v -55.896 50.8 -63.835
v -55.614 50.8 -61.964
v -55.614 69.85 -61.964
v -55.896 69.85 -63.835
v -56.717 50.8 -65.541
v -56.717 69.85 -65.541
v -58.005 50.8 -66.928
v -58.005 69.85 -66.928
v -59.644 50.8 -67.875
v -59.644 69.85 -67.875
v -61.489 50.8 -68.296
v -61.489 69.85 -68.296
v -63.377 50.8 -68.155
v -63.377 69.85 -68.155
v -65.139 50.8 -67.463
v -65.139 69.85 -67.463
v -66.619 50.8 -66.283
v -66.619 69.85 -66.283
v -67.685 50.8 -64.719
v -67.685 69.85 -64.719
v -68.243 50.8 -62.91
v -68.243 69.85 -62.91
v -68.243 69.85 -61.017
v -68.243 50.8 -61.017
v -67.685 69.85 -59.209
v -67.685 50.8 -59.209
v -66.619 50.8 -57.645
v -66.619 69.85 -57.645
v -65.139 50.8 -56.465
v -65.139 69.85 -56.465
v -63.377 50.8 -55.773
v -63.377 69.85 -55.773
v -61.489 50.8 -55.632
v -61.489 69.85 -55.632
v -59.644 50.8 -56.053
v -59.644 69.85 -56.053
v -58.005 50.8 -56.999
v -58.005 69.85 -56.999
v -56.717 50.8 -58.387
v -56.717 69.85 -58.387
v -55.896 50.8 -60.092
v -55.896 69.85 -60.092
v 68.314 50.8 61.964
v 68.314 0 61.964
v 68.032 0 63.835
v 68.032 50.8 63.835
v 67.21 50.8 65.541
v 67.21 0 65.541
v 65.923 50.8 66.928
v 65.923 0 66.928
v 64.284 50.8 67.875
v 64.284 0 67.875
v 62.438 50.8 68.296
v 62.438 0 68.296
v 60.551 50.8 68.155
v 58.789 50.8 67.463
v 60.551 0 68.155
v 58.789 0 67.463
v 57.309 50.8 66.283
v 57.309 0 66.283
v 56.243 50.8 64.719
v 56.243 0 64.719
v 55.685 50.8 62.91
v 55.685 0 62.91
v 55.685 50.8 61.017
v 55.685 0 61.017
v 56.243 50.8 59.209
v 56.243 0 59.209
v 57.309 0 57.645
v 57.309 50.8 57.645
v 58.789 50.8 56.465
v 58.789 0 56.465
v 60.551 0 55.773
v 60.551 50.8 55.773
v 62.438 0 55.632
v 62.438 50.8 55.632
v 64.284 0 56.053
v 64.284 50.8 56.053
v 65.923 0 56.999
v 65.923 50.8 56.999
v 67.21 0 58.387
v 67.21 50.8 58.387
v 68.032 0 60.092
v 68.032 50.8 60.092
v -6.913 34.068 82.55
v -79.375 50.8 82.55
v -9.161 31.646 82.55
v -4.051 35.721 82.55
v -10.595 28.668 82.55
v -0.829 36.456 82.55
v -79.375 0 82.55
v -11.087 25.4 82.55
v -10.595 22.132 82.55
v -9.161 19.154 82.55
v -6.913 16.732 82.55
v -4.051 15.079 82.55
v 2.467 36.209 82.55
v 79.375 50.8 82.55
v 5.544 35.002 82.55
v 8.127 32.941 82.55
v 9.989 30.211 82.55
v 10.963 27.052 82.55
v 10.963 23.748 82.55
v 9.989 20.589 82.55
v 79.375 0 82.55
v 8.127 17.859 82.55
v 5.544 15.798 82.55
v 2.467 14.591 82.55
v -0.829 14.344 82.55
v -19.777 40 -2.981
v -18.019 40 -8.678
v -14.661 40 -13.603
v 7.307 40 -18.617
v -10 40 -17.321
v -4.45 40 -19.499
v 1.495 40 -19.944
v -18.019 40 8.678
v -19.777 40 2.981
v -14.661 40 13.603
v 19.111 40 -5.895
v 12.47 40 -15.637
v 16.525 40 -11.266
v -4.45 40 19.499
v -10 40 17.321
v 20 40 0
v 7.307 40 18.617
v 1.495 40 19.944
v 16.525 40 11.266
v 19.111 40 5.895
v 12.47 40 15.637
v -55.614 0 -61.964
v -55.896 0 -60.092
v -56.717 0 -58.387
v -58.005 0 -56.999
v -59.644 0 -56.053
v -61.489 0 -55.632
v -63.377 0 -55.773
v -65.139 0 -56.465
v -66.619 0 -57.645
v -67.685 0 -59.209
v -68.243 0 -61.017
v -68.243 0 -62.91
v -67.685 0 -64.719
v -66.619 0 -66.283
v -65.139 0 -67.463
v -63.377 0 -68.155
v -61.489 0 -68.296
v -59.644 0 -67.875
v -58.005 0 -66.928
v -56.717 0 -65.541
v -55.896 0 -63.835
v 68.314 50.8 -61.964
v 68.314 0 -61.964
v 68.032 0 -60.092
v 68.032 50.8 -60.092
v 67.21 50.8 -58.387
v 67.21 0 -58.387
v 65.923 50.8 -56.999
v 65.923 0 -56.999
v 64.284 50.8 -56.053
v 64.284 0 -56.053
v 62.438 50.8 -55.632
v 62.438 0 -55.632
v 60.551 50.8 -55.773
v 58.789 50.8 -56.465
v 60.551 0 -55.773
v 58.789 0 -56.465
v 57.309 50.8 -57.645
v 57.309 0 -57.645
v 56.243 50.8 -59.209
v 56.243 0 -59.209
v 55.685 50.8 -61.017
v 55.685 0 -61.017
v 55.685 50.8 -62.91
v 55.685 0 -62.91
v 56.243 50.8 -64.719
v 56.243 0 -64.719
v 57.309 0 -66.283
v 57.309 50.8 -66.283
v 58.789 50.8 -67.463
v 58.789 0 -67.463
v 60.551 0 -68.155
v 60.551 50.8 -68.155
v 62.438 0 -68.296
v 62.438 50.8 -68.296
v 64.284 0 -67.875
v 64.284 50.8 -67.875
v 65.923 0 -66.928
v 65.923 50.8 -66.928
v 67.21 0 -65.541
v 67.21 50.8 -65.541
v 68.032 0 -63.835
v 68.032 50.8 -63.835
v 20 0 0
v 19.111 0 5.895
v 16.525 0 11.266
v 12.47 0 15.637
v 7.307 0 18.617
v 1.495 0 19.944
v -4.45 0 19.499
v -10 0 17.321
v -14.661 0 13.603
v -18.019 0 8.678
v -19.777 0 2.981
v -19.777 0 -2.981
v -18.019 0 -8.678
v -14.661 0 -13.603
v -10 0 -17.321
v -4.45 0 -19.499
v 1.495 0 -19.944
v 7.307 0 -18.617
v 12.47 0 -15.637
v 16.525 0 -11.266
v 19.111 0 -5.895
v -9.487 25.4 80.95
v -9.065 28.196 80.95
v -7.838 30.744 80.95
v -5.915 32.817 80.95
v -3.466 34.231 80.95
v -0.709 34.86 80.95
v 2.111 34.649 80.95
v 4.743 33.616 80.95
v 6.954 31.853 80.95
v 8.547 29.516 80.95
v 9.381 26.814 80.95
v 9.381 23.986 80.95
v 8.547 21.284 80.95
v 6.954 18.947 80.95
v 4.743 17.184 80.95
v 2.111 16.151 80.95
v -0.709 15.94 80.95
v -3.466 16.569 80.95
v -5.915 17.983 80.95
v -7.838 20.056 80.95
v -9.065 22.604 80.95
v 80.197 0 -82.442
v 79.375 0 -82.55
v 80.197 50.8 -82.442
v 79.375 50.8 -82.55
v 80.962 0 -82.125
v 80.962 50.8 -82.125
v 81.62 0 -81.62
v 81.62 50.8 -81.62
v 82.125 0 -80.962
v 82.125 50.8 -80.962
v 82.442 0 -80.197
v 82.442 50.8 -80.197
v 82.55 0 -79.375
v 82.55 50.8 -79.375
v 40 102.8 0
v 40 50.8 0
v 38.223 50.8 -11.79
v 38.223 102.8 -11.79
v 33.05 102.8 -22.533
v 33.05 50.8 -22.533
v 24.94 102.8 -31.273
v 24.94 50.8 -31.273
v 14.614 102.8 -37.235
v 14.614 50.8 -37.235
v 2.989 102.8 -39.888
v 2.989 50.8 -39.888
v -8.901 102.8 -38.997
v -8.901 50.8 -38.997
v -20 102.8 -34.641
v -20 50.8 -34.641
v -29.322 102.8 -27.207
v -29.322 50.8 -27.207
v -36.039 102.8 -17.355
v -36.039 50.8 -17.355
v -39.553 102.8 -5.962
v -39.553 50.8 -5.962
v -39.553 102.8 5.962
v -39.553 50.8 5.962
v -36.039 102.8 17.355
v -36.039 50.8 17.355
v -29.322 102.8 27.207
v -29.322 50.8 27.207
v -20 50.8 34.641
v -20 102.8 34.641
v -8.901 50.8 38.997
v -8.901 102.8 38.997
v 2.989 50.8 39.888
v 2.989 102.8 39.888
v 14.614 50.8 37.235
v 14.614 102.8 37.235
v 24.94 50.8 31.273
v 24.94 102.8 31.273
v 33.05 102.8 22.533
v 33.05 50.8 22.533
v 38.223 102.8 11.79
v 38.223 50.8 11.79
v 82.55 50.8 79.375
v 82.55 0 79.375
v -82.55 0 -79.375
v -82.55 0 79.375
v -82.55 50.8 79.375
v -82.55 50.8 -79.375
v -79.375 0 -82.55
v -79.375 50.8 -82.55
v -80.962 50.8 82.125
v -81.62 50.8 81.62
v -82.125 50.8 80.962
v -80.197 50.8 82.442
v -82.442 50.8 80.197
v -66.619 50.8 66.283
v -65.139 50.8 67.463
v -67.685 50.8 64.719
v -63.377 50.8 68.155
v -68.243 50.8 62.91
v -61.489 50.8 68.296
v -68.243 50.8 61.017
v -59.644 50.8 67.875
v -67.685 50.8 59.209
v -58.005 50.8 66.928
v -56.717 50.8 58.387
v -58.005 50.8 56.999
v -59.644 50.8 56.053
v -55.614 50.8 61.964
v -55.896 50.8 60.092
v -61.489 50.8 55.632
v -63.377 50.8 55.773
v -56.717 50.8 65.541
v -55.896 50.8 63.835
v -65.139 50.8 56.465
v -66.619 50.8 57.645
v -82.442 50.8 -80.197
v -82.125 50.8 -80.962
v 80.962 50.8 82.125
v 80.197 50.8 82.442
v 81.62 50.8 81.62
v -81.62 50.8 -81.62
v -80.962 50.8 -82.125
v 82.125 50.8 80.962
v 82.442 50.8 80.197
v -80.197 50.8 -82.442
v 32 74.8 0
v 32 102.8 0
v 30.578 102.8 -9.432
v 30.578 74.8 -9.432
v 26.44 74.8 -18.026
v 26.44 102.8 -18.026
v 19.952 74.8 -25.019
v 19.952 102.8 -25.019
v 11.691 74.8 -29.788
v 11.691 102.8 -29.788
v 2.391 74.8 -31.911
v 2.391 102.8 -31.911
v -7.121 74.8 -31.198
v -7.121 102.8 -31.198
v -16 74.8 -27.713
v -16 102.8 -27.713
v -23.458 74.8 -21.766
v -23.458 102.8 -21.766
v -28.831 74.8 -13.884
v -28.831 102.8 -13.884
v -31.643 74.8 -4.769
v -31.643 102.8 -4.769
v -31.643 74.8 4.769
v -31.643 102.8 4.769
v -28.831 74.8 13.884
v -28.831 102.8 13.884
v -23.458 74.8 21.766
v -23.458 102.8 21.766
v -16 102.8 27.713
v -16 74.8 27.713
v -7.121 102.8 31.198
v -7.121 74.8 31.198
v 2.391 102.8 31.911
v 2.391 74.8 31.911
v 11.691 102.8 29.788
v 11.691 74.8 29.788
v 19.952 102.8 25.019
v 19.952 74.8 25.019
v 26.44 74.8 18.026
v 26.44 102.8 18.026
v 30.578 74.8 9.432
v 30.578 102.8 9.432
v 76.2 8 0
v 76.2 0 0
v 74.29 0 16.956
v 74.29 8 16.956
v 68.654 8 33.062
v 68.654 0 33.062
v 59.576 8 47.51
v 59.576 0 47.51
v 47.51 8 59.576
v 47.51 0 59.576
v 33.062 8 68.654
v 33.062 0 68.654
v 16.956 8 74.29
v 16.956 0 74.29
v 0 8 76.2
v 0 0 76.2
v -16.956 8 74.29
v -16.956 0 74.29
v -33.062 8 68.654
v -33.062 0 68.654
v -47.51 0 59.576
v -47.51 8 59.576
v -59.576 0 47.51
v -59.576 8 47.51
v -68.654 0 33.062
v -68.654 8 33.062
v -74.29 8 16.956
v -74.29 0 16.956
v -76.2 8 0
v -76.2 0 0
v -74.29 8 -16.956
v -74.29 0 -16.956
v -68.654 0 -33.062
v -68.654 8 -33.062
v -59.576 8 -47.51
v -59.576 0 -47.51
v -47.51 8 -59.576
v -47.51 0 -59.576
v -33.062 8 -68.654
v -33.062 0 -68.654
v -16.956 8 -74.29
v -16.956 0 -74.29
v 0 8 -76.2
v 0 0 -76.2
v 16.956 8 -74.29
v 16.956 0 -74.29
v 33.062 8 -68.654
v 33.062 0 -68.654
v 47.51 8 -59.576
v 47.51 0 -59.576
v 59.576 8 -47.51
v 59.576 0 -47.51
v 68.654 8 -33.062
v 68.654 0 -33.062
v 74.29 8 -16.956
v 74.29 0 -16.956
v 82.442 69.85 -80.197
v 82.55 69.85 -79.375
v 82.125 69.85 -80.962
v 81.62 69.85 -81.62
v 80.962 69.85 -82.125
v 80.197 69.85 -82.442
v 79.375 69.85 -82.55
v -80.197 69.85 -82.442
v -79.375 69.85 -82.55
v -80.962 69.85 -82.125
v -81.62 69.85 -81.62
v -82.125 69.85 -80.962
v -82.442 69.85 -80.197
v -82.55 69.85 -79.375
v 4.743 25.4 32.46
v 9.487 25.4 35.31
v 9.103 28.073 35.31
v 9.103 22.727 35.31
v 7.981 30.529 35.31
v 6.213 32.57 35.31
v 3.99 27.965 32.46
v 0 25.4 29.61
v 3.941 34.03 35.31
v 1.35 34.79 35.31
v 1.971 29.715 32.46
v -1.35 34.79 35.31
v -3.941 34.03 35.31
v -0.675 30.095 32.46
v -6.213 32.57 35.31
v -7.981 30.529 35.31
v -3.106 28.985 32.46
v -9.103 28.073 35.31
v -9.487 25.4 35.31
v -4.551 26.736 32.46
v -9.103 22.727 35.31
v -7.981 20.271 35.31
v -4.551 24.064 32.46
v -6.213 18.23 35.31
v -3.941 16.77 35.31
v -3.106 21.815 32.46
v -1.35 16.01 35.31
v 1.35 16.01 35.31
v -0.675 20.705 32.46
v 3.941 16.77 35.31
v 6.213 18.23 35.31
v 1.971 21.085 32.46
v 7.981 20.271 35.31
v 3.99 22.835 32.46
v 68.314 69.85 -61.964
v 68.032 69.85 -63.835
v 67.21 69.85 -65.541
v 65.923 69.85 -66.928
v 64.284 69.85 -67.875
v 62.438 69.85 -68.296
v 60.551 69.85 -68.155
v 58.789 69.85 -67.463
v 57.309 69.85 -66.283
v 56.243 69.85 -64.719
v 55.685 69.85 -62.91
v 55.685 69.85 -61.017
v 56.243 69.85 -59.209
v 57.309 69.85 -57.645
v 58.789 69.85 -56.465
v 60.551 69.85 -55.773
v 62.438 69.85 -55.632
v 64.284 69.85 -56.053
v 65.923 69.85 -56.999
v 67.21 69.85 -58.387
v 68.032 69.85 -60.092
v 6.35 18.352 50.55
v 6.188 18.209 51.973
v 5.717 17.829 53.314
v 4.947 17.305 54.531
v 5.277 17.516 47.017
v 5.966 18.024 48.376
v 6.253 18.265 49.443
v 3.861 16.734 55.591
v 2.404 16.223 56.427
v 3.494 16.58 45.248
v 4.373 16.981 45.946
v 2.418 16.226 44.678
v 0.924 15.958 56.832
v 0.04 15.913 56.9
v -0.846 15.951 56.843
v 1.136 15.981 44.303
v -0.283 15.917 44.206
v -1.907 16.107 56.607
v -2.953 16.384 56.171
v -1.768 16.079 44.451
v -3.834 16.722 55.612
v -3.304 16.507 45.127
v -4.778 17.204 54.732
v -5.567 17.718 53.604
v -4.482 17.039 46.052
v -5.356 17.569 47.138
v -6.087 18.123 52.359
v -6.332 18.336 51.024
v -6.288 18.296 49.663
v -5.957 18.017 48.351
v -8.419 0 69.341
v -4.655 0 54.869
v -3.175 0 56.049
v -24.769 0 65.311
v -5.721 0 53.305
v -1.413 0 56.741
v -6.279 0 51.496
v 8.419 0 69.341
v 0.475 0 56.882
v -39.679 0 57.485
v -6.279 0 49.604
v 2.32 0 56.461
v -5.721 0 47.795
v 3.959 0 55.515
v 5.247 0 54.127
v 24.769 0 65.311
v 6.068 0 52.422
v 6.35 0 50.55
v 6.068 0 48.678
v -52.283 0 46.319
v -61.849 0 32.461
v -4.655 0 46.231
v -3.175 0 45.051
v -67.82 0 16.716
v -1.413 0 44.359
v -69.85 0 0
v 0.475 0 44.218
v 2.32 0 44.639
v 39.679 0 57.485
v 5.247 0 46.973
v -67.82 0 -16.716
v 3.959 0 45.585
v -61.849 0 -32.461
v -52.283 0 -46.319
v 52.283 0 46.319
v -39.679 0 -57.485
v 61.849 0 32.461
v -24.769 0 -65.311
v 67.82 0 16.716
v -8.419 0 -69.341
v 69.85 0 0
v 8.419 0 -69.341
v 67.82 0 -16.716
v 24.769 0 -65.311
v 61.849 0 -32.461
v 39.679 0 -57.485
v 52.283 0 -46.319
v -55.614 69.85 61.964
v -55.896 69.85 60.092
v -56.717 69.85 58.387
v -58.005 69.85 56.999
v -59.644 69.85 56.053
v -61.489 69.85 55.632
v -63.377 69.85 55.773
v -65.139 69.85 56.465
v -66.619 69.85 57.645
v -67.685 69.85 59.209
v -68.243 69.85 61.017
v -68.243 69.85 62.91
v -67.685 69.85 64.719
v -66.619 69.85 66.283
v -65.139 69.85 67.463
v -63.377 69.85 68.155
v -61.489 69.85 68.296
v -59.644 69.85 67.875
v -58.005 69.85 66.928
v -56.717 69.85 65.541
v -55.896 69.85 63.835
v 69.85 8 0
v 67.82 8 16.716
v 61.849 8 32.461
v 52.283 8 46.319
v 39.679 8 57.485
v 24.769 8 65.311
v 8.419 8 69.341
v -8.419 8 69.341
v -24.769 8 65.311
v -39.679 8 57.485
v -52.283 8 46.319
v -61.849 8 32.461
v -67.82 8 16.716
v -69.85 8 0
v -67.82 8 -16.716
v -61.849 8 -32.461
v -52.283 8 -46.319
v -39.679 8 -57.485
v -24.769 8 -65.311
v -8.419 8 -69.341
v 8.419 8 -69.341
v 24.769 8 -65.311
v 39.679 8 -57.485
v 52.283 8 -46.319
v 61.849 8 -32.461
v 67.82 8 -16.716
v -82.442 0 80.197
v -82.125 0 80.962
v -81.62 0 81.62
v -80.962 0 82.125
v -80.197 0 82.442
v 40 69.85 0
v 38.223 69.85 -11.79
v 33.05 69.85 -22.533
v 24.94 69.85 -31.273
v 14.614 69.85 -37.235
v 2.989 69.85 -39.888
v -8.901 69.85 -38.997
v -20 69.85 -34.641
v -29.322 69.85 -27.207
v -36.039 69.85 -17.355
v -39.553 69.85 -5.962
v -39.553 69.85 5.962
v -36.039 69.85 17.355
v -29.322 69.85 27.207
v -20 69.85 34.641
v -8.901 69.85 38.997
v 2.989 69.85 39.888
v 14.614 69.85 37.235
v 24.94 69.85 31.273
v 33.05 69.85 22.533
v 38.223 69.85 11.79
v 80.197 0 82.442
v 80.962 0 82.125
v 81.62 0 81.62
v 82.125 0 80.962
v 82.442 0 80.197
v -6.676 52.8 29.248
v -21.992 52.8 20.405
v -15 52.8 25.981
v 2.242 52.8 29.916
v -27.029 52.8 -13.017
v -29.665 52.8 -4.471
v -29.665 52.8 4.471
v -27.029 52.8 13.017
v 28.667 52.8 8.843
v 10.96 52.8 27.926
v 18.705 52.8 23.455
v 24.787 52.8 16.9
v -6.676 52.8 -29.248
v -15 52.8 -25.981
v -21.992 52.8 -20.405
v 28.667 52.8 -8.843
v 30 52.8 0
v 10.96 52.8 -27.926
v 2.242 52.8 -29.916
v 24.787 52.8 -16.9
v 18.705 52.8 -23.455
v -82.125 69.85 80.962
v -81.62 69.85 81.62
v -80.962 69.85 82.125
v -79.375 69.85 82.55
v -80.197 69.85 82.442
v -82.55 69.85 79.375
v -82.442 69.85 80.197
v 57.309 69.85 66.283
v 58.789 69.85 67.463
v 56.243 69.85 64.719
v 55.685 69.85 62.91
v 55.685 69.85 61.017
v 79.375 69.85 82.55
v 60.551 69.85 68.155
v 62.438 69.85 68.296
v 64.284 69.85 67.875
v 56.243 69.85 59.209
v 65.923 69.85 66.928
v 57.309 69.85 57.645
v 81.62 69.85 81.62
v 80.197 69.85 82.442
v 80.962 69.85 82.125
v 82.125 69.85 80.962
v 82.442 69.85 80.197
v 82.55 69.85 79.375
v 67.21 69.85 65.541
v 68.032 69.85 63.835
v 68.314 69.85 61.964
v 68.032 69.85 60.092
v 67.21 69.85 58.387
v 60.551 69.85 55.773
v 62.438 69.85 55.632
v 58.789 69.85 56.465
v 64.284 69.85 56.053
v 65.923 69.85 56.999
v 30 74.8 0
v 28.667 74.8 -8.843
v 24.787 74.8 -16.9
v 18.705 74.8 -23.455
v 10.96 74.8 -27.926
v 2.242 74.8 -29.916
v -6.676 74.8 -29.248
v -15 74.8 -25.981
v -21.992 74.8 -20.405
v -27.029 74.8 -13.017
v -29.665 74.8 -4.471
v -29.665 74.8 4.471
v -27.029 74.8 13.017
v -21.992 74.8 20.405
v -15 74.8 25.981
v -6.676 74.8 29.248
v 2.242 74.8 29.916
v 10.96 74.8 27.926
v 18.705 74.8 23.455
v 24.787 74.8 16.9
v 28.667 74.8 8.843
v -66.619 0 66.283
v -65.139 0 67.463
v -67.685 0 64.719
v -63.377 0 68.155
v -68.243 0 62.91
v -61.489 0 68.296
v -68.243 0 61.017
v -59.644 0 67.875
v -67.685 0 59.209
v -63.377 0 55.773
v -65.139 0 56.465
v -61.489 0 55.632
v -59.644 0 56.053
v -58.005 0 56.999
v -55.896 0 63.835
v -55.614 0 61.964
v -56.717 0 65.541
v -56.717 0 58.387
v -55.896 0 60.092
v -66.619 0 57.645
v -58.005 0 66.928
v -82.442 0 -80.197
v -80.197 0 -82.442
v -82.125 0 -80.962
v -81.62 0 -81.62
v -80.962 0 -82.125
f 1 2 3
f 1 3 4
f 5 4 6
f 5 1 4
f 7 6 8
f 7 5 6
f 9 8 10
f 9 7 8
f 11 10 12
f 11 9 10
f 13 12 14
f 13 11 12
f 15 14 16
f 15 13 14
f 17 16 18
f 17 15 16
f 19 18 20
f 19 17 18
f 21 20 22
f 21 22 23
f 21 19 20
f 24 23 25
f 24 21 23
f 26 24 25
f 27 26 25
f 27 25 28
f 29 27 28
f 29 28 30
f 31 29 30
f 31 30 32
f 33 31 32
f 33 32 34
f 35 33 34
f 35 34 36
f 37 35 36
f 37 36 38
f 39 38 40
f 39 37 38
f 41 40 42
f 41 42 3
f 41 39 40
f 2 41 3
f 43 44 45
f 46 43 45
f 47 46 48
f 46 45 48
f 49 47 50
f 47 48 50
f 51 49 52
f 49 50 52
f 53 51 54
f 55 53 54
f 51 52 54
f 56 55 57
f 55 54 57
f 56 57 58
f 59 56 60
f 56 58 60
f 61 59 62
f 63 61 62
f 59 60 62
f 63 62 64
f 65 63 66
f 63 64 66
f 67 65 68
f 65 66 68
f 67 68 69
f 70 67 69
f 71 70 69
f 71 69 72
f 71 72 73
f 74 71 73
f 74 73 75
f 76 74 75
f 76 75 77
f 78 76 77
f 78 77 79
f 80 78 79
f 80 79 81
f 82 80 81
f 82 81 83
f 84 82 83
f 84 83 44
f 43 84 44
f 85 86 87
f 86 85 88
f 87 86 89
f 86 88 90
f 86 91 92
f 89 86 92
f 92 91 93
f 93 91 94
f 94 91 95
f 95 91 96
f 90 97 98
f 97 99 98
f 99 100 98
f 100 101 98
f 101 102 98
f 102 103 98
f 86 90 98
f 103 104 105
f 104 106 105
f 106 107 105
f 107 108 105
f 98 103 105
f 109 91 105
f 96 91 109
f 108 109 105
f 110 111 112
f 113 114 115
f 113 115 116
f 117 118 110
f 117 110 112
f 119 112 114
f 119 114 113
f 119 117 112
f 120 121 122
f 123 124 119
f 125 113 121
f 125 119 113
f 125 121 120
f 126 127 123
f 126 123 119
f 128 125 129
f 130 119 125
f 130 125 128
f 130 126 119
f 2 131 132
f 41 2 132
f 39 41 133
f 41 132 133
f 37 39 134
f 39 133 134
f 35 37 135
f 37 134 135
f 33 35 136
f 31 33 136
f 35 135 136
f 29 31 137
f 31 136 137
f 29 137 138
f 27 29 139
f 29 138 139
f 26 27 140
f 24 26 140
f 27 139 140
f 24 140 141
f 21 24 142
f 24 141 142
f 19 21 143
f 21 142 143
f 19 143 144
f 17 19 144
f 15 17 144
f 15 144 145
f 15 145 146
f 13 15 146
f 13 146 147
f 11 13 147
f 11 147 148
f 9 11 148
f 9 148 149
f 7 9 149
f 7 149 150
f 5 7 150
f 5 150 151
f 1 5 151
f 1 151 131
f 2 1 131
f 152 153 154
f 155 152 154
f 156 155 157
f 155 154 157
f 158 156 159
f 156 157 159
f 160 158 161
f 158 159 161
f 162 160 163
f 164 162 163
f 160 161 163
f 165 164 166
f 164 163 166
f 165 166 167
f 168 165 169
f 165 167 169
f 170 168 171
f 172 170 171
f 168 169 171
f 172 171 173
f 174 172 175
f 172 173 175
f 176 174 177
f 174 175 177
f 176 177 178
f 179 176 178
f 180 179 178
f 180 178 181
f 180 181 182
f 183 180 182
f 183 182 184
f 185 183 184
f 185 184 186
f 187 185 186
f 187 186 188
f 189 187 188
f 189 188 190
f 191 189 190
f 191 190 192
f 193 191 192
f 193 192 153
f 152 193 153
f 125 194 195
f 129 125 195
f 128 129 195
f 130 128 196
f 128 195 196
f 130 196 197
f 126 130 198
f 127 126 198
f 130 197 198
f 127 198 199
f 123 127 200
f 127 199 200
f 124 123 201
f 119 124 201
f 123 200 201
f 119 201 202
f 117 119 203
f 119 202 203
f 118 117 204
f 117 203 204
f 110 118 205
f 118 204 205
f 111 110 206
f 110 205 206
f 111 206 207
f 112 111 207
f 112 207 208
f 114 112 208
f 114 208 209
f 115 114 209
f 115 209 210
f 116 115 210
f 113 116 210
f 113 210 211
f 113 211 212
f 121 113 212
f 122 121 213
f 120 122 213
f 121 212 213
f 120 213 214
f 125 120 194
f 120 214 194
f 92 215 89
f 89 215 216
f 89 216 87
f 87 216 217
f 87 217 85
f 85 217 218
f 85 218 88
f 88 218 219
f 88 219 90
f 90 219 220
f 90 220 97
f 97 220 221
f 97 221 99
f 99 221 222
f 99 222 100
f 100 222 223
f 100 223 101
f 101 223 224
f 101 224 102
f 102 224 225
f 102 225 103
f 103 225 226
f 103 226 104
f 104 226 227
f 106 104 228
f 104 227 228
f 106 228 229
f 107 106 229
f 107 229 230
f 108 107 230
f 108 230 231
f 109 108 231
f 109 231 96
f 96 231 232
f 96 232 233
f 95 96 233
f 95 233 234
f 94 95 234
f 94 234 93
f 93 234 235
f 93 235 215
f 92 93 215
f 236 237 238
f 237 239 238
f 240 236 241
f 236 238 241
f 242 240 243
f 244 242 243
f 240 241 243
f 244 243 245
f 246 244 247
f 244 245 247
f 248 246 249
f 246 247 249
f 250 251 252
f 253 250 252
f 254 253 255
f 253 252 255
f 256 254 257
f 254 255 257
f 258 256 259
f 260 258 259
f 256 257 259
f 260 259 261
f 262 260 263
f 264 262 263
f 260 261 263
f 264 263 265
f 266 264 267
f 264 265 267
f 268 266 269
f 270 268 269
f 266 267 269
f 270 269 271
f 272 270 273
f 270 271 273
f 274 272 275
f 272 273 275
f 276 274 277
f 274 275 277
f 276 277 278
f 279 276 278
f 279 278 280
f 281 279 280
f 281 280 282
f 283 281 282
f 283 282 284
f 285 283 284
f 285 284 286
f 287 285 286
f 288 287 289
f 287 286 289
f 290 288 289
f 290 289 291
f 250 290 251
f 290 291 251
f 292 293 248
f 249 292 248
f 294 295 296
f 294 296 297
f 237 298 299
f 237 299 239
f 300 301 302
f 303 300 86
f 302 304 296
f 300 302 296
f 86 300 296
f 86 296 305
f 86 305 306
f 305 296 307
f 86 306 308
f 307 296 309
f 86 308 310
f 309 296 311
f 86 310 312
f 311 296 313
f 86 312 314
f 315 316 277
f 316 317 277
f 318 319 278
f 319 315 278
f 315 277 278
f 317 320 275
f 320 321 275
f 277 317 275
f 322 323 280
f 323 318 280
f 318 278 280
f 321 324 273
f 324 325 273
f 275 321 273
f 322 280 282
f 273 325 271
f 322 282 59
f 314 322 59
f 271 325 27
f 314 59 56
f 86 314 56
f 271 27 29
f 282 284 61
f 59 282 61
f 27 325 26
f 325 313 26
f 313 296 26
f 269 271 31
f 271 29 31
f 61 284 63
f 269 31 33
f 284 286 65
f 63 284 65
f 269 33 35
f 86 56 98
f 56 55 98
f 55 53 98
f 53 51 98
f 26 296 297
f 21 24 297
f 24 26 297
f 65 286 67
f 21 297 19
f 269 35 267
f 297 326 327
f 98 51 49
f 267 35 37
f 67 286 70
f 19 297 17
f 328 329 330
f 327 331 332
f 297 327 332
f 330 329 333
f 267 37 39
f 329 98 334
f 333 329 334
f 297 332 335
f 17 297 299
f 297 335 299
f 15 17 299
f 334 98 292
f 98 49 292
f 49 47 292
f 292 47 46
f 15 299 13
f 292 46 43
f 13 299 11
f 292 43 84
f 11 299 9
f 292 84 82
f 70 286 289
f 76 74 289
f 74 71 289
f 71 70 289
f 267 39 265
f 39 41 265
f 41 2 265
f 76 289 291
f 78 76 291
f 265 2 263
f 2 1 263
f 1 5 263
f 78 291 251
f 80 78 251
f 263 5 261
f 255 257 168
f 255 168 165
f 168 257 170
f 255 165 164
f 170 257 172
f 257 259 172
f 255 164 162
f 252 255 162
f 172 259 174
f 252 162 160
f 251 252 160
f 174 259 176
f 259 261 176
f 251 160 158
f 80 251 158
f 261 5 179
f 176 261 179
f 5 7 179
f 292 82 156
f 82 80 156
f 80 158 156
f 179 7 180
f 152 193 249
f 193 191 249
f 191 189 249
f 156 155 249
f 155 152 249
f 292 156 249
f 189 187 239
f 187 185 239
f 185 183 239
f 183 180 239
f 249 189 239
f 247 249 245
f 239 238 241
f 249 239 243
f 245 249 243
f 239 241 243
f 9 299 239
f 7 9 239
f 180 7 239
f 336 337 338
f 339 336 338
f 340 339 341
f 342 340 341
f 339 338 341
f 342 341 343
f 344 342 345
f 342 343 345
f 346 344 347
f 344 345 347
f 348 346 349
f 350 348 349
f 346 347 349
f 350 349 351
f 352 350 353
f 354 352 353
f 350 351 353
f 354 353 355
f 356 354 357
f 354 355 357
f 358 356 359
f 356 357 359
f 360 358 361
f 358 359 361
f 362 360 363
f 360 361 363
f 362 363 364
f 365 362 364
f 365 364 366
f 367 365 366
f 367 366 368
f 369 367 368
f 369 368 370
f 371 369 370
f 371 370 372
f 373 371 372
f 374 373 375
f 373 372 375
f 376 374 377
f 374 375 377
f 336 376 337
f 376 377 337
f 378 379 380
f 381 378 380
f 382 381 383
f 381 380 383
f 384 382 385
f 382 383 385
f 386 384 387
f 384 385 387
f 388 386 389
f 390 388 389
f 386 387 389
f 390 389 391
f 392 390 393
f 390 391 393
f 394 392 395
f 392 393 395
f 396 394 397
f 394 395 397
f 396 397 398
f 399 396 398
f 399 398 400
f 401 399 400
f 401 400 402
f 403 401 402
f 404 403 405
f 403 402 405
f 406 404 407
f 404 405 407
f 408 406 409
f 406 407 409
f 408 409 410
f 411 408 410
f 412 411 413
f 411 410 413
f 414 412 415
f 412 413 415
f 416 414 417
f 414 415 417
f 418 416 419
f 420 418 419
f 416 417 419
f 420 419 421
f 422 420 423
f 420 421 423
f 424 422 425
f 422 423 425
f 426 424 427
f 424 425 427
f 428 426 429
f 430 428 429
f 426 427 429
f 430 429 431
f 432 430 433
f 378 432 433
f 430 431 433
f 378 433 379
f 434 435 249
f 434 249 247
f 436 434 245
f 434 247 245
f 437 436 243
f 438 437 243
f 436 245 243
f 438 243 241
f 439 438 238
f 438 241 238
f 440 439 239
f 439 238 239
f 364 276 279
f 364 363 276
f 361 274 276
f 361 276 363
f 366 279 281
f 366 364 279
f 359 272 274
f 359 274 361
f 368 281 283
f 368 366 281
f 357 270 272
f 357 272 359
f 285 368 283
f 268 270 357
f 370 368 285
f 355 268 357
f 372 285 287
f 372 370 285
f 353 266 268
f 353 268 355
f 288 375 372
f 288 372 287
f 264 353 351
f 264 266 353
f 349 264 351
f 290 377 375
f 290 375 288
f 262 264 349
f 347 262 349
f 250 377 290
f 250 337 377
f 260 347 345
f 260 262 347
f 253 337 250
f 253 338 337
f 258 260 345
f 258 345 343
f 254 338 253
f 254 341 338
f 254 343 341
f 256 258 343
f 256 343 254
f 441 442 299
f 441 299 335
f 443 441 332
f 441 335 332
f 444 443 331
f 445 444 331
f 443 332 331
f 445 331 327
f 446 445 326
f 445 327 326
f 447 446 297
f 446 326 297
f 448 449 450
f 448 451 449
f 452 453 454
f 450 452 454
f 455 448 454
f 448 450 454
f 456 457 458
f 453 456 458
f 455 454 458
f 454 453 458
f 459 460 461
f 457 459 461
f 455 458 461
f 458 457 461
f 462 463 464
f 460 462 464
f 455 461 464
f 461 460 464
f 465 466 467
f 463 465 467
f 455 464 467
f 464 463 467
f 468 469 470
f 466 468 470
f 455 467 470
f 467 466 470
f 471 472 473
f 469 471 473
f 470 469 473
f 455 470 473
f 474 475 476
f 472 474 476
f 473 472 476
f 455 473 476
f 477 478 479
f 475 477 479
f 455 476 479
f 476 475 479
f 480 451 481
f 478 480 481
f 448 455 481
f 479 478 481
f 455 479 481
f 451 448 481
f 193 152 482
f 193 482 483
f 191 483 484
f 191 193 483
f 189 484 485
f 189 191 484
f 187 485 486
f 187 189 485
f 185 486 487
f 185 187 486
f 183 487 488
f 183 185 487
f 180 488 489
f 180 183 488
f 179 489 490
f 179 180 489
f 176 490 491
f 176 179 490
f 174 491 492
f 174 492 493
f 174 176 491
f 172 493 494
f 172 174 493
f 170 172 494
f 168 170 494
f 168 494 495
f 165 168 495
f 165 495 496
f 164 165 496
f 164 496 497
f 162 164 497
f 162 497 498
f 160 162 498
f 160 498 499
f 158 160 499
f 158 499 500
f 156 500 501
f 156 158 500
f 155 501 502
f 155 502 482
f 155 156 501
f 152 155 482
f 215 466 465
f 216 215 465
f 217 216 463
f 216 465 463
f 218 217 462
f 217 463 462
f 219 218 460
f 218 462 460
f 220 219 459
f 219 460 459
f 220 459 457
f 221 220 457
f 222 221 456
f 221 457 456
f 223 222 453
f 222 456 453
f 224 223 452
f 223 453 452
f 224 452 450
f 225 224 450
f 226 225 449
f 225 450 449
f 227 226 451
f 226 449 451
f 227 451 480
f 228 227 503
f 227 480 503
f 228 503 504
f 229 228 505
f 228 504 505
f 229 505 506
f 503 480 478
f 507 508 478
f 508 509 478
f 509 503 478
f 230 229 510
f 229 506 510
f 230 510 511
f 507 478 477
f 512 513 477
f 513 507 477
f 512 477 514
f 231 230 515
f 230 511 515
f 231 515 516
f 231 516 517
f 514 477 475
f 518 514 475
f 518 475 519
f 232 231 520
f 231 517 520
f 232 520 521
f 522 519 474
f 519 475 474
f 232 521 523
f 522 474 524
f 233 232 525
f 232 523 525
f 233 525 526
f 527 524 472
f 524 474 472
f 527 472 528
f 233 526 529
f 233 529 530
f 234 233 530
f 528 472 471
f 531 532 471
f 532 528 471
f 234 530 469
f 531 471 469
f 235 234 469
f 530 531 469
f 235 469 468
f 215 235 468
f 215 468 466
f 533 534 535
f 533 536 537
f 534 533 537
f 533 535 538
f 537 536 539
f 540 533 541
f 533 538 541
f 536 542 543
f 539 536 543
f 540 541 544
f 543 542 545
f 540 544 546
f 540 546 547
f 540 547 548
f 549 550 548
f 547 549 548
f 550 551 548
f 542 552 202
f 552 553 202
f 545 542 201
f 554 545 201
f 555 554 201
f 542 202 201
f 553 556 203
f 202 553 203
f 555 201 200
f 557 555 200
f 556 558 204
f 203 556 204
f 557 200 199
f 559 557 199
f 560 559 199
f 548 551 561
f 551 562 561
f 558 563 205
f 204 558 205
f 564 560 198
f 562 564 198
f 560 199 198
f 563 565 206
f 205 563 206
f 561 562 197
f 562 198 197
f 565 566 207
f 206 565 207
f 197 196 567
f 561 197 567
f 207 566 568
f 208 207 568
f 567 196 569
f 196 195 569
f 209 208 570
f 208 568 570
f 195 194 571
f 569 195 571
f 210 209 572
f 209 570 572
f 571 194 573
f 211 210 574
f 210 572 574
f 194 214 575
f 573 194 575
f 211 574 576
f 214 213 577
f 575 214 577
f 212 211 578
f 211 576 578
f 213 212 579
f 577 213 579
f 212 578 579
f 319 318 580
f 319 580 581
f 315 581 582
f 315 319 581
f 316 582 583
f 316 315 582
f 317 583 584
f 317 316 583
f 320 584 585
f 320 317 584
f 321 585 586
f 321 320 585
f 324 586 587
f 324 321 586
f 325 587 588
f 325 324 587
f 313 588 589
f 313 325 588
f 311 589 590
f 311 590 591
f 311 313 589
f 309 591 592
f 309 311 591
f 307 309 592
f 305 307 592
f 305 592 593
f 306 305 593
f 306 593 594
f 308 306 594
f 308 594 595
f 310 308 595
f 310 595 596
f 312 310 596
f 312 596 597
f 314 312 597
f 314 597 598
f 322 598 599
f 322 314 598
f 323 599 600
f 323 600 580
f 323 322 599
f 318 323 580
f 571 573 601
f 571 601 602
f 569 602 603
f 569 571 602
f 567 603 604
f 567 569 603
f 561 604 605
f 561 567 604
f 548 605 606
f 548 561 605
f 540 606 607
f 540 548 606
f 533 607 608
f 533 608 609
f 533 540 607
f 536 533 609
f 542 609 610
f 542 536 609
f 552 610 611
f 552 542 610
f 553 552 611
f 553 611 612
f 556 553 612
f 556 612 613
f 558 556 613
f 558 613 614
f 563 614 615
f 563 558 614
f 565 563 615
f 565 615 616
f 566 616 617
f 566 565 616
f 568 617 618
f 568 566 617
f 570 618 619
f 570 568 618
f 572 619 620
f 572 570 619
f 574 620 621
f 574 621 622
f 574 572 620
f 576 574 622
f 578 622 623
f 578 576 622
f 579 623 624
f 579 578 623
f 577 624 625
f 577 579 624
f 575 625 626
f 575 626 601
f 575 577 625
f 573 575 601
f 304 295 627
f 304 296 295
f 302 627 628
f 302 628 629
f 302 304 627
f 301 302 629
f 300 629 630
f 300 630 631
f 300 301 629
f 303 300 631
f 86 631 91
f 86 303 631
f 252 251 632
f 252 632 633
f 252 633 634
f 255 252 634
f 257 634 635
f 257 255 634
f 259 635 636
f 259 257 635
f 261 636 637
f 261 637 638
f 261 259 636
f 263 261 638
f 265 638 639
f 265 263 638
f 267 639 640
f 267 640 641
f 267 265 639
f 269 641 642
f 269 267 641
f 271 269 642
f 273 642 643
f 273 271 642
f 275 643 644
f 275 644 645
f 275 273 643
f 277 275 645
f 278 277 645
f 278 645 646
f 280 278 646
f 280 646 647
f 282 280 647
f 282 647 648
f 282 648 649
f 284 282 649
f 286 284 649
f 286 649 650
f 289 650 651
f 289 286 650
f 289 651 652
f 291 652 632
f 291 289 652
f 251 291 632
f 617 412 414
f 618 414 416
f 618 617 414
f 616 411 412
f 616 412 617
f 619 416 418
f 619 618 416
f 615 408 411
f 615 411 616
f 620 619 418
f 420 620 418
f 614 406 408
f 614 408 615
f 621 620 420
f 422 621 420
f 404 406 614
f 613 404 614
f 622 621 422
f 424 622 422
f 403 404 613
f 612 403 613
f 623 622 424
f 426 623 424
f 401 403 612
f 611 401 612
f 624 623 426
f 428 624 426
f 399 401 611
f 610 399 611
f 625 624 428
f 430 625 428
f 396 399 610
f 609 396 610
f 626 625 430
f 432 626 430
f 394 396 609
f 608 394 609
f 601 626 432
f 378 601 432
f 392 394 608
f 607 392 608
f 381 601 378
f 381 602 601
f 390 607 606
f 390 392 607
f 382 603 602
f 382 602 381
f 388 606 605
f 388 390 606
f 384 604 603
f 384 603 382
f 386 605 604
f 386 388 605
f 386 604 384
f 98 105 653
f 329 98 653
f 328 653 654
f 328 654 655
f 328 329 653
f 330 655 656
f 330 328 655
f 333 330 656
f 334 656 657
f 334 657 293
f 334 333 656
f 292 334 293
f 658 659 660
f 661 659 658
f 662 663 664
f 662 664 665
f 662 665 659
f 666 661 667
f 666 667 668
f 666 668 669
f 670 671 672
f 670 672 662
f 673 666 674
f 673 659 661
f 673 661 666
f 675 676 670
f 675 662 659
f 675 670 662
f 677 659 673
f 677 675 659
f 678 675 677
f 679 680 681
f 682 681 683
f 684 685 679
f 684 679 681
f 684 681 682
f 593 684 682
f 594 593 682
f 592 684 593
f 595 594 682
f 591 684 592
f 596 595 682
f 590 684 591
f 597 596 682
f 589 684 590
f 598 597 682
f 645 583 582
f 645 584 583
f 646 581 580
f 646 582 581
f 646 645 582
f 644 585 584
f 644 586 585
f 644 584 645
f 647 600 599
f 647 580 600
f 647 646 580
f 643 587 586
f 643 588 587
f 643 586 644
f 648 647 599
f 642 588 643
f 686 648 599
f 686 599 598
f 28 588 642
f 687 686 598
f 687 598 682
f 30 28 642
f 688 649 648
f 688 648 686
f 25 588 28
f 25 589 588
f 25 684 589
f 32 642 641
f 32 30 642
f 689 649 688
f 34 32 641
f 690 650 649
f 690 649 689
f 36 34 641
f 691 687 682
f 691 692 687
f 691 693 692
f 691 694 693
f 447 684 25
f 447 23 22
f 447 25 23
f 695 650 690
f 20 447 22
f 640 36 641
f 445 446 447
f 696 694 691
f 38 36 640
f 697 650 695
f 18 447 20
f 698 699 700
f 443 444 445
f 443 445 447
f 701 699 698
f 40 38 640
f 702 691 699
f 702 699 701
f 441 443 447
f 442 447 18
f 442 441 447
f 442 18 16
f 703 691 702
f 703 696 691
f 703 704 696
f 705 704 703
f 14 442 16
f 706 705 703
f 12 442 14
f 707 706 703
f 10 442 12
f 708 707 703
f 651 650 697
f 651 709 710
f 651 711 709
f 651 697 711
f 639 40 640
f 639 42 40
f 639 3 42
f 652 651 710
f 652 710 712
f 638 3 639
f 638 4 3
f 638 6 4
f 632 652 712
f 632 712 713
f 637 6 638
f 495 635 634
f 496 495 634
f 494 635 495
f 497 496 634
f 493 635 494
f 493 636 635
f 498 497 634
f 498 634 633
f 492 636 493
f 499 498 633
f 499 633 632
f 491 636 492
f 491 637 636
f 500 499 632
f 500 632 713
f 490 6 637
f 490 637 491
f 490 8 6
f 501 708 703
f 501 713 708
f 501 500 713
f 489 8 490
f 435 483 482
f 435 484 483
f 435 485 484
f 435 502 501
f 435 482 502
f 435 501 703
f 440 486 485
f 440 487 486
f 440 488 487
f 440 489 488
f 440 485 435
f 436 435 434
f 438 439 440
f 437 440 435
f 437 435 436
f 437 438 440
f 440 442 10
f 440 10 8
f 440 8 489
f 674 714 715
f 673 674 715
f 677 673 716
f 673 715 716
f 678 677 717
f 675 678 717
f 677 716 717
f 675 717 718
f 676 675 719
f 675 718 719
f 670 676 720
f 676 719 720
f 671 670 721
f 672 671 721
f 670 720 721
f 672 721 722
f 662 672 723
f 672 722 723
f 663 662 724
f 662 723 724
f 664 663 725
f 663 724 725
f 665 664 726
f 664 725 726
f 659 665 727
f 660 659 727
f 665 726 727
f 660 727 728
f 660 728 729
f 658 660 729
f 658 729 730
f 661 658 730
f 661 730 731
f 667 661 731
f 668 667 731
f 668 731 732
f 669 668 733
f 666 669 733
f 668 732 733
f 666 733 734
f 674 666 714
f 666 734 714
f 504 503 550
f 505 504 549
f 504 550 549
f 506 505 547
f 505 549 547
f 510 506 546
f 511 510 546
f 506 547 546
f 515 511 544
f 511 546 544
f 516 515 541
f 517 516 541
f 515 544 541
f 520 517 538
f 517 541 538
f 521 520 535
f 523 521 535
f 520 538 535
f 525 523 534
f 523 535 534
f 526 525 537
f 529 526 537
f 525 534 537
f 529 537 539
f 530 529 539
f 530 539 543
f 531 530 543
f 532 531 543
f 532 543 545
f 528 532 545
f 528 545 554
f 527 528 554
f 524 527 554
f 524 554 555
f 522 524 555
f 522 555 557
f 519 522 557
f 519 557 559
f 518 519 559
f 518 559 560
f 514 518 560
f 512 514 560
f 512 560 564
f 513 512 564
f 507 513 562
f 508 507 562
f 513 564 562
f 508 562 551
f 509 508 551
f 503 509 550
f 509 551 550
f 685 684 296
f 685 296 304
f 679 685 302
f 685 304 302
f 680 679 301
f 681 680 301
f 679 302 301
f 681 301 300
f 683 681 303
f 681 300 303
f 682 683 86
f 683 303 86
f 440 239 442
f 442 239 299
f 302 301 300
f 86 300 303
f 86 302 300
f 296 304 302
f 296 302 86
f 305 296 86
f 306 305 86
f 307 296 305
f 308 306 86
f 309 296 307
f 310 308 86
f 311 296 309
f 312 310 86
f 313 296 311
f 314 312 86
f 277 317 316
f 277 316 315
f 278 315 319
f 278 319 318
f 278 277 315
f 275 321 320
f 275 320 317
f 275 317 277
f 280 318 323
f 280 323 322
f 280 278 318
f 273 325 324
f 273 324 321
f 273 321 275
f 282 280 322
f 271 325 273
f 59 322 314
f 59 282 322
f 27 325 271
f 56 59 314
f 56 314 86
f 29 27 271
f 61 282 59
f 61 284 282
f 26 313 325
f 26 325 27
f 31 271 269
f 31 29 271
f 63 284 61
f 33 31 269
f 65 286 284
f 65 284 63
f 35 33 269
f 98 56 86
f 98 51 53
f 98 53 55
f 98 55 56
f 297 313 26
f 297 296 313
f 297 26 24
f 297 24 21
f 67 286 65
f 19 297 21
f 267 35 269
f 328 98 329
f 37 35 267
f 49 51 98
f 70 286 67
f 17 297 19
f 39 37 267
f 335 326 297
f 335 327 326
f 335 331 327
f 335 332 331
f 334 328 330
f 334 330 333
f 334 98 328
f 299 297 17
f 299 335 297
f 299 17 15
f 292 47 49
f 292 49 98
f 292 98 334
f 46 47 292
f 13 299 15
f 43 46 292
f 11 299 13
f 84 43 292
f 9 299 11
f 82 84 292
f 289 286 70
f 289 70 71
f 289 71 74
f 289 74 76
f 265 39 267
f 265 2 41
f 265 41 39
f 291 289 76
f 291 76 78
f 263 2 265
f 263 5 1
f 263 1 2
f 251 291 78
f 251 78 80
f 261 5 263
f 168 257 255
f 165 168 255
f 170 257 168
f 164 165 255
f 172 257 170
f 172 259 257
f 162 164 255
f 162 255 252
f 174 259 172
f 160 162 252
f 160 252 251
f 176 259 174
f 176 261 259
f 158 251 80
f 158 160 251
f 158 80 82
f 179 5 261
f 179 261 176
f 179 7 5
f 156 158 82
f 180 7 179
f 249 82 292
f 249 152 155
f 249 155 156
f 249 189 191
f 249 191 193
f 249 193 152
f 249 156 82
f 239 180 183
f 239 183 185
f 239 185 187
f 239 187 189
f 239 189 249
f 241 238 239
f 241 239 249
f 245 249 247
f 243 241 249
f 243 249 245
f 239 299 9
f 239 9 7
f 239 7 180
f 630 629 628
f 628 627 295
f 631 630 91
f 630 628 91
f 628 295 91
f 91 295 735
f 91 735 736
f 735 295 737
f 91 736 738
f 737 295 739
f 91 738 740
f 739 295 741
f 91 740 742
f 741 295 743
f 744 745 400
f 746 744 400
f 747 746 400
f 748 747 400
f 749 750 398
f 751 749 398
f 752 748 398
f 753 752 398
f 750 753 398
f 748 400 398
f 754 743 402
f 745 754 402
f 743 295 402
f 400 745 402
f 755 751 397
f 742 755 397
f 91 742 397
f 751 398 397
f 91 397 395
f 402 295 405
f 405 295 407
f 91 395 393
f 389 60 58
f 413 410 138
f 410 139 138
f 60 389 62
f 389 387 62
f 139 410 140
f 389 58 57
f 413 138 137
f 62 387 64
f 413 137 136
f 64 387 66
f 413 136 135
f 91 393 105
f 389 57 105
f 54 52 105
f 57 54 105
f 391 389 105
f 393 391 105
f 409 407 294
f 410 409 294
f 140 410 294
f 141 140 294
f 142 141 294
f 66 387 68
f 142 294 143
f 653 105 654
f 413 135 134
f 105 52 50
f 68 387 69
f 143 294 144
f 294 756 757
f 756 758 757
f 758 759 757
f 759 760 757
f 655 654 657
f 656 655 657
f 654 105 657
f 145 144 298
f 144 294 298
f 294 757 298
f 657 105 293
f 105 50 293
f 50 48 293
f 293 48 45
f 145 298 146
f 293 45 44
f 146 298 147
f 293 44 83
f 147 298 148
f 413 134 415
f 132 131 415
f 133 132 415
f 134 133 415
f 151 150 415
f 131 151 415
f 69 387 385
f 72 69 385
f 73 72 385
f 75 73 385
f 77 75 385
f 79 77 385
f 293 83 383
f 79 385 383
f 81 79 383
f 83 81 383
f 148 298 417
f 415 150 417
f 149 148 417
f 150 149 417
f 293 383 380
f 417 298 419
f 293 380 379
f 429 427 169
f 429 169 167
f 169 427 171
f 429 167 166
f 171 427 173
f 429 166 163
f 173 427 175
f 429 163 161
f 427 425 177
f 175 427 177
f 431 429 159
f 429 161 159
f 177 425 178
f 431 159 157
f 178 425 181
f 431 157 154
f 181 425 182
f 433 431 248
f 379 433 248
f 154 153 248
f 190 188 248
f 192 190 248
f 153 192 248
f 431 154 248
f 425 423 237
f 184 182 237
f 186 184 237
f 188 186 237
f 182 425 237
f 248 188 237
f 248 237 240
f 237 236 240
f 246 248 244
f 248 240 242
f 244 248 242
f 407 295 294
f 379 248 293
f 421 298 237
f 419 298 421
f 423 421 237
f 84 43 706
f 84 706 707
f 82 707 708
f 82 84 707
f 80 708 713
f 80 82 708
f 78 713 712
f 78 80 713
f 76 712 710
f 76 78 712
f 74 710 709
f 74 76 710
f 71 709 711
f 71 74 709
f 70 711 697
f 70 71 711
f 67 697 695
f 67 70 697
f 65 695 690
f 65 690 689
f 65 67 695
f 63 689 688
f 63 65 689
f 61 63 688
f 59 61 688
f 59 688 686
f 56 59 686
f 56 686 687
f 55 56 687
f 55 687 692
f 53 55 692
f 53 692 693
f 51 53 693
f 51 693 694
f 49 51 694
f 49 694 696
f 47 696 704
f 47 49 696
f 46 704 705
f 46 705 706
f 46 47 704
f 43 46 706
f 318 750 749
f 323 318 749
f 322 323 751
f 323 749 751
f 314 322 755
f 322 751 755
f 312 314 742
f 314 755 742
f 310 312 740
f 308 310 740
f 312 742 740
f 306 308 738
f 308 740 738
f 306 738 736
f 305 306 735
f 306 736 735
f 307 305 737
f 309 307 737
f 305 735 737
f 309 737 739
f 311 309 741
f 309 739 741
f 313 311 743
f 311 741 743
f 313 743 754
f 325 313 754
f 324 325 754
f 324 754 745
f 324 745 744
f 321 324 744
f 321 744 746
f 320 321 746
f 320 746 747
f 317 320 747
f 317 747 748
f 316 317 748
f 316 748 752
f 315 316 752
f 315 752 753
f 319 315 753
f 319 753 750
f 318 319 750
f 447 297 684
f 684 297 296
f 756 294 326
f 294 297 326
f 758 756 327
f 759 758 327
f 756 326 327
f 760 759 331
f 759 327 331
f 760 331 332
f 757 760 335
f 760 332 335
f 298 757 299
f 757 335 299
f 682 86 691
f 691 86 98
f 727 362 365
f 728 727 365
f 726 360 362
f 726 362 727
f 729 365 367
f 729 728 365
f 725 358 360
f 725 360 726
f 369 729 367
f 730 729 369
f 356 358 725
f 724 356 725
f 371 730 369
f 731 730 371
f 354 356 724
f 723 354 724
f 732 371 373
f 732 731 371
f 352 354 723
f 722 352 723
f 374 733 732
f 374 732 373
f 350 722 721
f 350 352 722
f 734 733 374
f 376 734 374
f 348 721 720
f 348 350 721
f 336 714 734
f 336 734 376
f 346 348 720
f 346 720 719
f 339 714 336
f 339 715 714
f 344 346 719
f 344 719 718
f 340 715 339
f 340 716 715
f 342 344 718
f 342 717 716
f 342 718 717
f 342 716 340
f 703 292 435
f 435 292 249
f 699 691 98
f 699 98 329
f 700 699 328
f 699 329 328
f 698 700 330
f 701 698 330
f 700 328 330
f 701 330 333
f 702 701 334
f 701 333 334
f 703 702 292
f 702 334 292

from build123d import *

# Parameters (mm, degrees)
SKETCH1_W                              = 165.1
SKETCH1_H                              = 165.1
BOSS_EXTRUDE1_DEPTH                    = 50.8
SKETCH2_R                              = 40
BOSS_EXTRUDE2_DEPTH                    = 52
SKETCH3_R                              = 32
CUT_EXTRUDE1_DEPTH                     = 28
SKETCH4_R                              = 30
CUT_EXTRUDE2_DEPTH                     = 22
FILLET1_R                              = 3.175
SKETCH5_R                              = 20
CUT_EXTRUDE3_DEPTH                     = 40
SKETCH6_R                              = 76.2
SKETCH6_R_2                            = 69.85
CUT_EXTRUDE4_DEPTH                     = 8
F_1_2_14_NPSM_TAPPED_HOLE1_D           = 18.9738
F_1_2_14_NPSM_TAPPED_HOLE1_DEPTH       = 47.24
F_1_2_14_NPSM_TAPPED_HOLE1_CSINK_D     = 22.1742
F_1_2_14_NPSM_TAPPED_HOLE1_CSINK_ANGLE = 90
F_1_2_14_NPSM_TAPPED_HOLE1_TIP         = 5.700304607
SKETCH10_R                             = 6.35
CUT_EXTRUDE5_DEPTH                     = 25
SKETCH11_R                             = 6.35
CUT_EXTRUDE6_DEPTH                     = 103.8
SKETCH12_R                             = 40
SKETCH12_R_2                           = 6.35
BOSS_EXTRUDE3_DEPTH                    = 19.05


with BuildPart() as part:
    # Sketch1 → Boss-Extrude1 (new body)
    with BuildSketch(Plane(origin=(0, 0, 0), x_dir=(1, 0, 0), z_dir=(0, 1, 0))):
        Rectangle(SKETCH1_W, SKETCH1_H)
    extrude(amount=BOSS_EXTRUDE1_DEPTH)

    # Sketch2 → Boss-Extrude2 (add)
    with BuildSketch(Plane(origin=(0, 50.8, 0), x_dir=(1, 0, 0), z_dir=(0, 1, 0))):
        Circle(SKETCH2_R)
    extrude(amount=BOSS_EXTRUDE2_DEPTH)

    # Sketch3 → Cut-Extrude1 (cut)
    with BuildSketch(Plane(origin=(0, 102.8, 0), x_dir=(1, 0, 0), z_dir=(0, 1, 0))):
        Circle(SKETCH3_R)
    extrude(amount=-CUT_EXTRUDE1_DEPTH, mode=Mode.SUBTRACT)

    # Sketch4 → Cut-Extrude2 (cut)
    with BuildSketch(Plane(origin=(0, 74.8, 0), x_dir=(1, 0, 0), z_dir=(0, 1, 0))):
        Circle(SKETCH4_R)
    extrude(amount=-CUT_EXTRUDE2_DEPTH, mode=Mode.SUBTRACT)

    # Fillet1
    fillet1_edges = [part.edges().sort_by_distance(p)[0] for p in [
        (82.55, 25.4, 82.55),
        (-82.55, 25.4, 82.55),
        (-82.55, 25.4, -82.55),
        (82.55, 25.4, -82.55),
    ]]
    fillet(fillet1_edges, radius=FILLET1_R)

    # Sketch5 → Cut-Extrude3 (cut)
    with BuildSketch(Plane.XZ):
        Circle(SKETCH5_R)
    extrude(amount=-CUT_EXTRUDE3_DEPTH, mode=Mode.SUBTRACT)

    # Sketch6 → Cut-Extrude4 (cut)
    with BuildSketch(Plane.XZ):
        Circle(SKETCH6_R)
        Circle(SKETCH6_R_2, mode=Mode.SUBTRACT)
    extrude(amount=-CUT_EXTRUDE4_DEPTH, mode=Mode.SUBTRACT)

    # 1/2-14 NPSM Tapped Hole1
    with Locations(Plane.XY.offset(82.55)):
        with Locations((0, 25.4)):
            CounterSinkHole(F_1_2_14_NPSM_TAPPED_HOLE1_D / 2, F_1_2_14_NPSM_TAPPED_HOLE1_CSINK_D / 2, depth=F_1_2_14_NPSM_TAPPED_HOLE1_DEPTH, counter_sink_angle=F_1_2_14_NPSM_TAPPED_HOLE1_CSINK_ANGLE)
            with Locations((0, 0, -(F_1_2_14_NPSM_TAPPED_HOLE1_DEPTH + F_1_2_14_NPSM_TAPPED_HOLE1_TIP / 2))):  # 118° drill point
                Cone(0, F_1_2_14_NPSM_TAPPED_HOLE1_D / 2, F_1_2_14_NPSM_TAPPED_HOLE1_TIP, mode=Mode.SUBTRACT)

    # Sketch10 → Cut-Extrude5 (cut)
    with BuildSketch(Plane.XZ):
        with Locations((0, 50.55)):
            Circle(SKETCH10_R)
    extrude(amount=-CUT_EXTRUDE5_DEPTH, mode=Mode.SUBTRACT)

    # Sketch11 → Cut-Extrude6 (cut, through all)
    with BuildSketch(Plane.XZ):
        with Locations((-61.963767235, 61.963767235)):
            Circle(SKETCH11_R)
        with Locations((61.963767235, 61.963767235)):
            Circle(SKETCH11_R)
        with Locations((61.963767235, -61.963767235)):
            Circle(SKETCH11_R)
        with Locations((-61.963767235, -61.963767235)):
            Circle(SKETCH11_R)
    extrude(amount=-CUT_EXTRUDE6_DEPTH, mode=Mode.SUBTRACT)


with BuildPart() as body_2:
    # Sketch12 → Boss-Extrude3 (new body)
    with BuildSketch(Plane(origin=(0, 50.8, 0), x_dir=(1, 0, 0), z_dir=(0, 1, 0))):
        with BuildLine():
            Line((-82.55, 79.375), (-82.55, -79.375))
            ThreePointArc((-82.55, -79.375), (-81.62006403, -81.62006403), (-79.375, -82.55))
            Line((-79.375, -82.55), (79.375, -82.55))
            ThreePointArc((79.375, -82.55), (81.62006403, -81.62006403), (82.55, -79.375))
            Line((82.55, -79.375), (82.55, 79.375))
            ThreePointArc((82.55, 79.375), (81.62006403, 81.62006403), (79.375, 82.55))
            Line((79.375, 82.55), (-79.375, 82.55))
            ThreePointArc((-79.375, 82.55), (-81.62006403, 81.62006403), (-82.55, 79.375))
        make_face()
        Circle(SKETCH12_R, mode=Mode.SUBTRACT)
        with Locations((61.963767235, 61.963767235)):
            Circle(SKETCH12_R_2, mode=Mode.SUBTRACT)
        with Locations((61.963767235, -61.963767235)):
            Circle(SKETCH12_R_2, mode=Mode.SUBTRACT)
        with Locations((-61.963767235, -61.963767235)):
            Circle(SKETCH12_R_2, mode=Mode.SUBTRACT)
        with Locations((-61.963767235, 61.963767235)):
            Circle(SKETCH12_R_2, mode=Mode.SUBTRACT)
    extrude(amount=BOSS_EXTRUDE3_DEPTH)


solid = Compound([part.part, body_2.part])
